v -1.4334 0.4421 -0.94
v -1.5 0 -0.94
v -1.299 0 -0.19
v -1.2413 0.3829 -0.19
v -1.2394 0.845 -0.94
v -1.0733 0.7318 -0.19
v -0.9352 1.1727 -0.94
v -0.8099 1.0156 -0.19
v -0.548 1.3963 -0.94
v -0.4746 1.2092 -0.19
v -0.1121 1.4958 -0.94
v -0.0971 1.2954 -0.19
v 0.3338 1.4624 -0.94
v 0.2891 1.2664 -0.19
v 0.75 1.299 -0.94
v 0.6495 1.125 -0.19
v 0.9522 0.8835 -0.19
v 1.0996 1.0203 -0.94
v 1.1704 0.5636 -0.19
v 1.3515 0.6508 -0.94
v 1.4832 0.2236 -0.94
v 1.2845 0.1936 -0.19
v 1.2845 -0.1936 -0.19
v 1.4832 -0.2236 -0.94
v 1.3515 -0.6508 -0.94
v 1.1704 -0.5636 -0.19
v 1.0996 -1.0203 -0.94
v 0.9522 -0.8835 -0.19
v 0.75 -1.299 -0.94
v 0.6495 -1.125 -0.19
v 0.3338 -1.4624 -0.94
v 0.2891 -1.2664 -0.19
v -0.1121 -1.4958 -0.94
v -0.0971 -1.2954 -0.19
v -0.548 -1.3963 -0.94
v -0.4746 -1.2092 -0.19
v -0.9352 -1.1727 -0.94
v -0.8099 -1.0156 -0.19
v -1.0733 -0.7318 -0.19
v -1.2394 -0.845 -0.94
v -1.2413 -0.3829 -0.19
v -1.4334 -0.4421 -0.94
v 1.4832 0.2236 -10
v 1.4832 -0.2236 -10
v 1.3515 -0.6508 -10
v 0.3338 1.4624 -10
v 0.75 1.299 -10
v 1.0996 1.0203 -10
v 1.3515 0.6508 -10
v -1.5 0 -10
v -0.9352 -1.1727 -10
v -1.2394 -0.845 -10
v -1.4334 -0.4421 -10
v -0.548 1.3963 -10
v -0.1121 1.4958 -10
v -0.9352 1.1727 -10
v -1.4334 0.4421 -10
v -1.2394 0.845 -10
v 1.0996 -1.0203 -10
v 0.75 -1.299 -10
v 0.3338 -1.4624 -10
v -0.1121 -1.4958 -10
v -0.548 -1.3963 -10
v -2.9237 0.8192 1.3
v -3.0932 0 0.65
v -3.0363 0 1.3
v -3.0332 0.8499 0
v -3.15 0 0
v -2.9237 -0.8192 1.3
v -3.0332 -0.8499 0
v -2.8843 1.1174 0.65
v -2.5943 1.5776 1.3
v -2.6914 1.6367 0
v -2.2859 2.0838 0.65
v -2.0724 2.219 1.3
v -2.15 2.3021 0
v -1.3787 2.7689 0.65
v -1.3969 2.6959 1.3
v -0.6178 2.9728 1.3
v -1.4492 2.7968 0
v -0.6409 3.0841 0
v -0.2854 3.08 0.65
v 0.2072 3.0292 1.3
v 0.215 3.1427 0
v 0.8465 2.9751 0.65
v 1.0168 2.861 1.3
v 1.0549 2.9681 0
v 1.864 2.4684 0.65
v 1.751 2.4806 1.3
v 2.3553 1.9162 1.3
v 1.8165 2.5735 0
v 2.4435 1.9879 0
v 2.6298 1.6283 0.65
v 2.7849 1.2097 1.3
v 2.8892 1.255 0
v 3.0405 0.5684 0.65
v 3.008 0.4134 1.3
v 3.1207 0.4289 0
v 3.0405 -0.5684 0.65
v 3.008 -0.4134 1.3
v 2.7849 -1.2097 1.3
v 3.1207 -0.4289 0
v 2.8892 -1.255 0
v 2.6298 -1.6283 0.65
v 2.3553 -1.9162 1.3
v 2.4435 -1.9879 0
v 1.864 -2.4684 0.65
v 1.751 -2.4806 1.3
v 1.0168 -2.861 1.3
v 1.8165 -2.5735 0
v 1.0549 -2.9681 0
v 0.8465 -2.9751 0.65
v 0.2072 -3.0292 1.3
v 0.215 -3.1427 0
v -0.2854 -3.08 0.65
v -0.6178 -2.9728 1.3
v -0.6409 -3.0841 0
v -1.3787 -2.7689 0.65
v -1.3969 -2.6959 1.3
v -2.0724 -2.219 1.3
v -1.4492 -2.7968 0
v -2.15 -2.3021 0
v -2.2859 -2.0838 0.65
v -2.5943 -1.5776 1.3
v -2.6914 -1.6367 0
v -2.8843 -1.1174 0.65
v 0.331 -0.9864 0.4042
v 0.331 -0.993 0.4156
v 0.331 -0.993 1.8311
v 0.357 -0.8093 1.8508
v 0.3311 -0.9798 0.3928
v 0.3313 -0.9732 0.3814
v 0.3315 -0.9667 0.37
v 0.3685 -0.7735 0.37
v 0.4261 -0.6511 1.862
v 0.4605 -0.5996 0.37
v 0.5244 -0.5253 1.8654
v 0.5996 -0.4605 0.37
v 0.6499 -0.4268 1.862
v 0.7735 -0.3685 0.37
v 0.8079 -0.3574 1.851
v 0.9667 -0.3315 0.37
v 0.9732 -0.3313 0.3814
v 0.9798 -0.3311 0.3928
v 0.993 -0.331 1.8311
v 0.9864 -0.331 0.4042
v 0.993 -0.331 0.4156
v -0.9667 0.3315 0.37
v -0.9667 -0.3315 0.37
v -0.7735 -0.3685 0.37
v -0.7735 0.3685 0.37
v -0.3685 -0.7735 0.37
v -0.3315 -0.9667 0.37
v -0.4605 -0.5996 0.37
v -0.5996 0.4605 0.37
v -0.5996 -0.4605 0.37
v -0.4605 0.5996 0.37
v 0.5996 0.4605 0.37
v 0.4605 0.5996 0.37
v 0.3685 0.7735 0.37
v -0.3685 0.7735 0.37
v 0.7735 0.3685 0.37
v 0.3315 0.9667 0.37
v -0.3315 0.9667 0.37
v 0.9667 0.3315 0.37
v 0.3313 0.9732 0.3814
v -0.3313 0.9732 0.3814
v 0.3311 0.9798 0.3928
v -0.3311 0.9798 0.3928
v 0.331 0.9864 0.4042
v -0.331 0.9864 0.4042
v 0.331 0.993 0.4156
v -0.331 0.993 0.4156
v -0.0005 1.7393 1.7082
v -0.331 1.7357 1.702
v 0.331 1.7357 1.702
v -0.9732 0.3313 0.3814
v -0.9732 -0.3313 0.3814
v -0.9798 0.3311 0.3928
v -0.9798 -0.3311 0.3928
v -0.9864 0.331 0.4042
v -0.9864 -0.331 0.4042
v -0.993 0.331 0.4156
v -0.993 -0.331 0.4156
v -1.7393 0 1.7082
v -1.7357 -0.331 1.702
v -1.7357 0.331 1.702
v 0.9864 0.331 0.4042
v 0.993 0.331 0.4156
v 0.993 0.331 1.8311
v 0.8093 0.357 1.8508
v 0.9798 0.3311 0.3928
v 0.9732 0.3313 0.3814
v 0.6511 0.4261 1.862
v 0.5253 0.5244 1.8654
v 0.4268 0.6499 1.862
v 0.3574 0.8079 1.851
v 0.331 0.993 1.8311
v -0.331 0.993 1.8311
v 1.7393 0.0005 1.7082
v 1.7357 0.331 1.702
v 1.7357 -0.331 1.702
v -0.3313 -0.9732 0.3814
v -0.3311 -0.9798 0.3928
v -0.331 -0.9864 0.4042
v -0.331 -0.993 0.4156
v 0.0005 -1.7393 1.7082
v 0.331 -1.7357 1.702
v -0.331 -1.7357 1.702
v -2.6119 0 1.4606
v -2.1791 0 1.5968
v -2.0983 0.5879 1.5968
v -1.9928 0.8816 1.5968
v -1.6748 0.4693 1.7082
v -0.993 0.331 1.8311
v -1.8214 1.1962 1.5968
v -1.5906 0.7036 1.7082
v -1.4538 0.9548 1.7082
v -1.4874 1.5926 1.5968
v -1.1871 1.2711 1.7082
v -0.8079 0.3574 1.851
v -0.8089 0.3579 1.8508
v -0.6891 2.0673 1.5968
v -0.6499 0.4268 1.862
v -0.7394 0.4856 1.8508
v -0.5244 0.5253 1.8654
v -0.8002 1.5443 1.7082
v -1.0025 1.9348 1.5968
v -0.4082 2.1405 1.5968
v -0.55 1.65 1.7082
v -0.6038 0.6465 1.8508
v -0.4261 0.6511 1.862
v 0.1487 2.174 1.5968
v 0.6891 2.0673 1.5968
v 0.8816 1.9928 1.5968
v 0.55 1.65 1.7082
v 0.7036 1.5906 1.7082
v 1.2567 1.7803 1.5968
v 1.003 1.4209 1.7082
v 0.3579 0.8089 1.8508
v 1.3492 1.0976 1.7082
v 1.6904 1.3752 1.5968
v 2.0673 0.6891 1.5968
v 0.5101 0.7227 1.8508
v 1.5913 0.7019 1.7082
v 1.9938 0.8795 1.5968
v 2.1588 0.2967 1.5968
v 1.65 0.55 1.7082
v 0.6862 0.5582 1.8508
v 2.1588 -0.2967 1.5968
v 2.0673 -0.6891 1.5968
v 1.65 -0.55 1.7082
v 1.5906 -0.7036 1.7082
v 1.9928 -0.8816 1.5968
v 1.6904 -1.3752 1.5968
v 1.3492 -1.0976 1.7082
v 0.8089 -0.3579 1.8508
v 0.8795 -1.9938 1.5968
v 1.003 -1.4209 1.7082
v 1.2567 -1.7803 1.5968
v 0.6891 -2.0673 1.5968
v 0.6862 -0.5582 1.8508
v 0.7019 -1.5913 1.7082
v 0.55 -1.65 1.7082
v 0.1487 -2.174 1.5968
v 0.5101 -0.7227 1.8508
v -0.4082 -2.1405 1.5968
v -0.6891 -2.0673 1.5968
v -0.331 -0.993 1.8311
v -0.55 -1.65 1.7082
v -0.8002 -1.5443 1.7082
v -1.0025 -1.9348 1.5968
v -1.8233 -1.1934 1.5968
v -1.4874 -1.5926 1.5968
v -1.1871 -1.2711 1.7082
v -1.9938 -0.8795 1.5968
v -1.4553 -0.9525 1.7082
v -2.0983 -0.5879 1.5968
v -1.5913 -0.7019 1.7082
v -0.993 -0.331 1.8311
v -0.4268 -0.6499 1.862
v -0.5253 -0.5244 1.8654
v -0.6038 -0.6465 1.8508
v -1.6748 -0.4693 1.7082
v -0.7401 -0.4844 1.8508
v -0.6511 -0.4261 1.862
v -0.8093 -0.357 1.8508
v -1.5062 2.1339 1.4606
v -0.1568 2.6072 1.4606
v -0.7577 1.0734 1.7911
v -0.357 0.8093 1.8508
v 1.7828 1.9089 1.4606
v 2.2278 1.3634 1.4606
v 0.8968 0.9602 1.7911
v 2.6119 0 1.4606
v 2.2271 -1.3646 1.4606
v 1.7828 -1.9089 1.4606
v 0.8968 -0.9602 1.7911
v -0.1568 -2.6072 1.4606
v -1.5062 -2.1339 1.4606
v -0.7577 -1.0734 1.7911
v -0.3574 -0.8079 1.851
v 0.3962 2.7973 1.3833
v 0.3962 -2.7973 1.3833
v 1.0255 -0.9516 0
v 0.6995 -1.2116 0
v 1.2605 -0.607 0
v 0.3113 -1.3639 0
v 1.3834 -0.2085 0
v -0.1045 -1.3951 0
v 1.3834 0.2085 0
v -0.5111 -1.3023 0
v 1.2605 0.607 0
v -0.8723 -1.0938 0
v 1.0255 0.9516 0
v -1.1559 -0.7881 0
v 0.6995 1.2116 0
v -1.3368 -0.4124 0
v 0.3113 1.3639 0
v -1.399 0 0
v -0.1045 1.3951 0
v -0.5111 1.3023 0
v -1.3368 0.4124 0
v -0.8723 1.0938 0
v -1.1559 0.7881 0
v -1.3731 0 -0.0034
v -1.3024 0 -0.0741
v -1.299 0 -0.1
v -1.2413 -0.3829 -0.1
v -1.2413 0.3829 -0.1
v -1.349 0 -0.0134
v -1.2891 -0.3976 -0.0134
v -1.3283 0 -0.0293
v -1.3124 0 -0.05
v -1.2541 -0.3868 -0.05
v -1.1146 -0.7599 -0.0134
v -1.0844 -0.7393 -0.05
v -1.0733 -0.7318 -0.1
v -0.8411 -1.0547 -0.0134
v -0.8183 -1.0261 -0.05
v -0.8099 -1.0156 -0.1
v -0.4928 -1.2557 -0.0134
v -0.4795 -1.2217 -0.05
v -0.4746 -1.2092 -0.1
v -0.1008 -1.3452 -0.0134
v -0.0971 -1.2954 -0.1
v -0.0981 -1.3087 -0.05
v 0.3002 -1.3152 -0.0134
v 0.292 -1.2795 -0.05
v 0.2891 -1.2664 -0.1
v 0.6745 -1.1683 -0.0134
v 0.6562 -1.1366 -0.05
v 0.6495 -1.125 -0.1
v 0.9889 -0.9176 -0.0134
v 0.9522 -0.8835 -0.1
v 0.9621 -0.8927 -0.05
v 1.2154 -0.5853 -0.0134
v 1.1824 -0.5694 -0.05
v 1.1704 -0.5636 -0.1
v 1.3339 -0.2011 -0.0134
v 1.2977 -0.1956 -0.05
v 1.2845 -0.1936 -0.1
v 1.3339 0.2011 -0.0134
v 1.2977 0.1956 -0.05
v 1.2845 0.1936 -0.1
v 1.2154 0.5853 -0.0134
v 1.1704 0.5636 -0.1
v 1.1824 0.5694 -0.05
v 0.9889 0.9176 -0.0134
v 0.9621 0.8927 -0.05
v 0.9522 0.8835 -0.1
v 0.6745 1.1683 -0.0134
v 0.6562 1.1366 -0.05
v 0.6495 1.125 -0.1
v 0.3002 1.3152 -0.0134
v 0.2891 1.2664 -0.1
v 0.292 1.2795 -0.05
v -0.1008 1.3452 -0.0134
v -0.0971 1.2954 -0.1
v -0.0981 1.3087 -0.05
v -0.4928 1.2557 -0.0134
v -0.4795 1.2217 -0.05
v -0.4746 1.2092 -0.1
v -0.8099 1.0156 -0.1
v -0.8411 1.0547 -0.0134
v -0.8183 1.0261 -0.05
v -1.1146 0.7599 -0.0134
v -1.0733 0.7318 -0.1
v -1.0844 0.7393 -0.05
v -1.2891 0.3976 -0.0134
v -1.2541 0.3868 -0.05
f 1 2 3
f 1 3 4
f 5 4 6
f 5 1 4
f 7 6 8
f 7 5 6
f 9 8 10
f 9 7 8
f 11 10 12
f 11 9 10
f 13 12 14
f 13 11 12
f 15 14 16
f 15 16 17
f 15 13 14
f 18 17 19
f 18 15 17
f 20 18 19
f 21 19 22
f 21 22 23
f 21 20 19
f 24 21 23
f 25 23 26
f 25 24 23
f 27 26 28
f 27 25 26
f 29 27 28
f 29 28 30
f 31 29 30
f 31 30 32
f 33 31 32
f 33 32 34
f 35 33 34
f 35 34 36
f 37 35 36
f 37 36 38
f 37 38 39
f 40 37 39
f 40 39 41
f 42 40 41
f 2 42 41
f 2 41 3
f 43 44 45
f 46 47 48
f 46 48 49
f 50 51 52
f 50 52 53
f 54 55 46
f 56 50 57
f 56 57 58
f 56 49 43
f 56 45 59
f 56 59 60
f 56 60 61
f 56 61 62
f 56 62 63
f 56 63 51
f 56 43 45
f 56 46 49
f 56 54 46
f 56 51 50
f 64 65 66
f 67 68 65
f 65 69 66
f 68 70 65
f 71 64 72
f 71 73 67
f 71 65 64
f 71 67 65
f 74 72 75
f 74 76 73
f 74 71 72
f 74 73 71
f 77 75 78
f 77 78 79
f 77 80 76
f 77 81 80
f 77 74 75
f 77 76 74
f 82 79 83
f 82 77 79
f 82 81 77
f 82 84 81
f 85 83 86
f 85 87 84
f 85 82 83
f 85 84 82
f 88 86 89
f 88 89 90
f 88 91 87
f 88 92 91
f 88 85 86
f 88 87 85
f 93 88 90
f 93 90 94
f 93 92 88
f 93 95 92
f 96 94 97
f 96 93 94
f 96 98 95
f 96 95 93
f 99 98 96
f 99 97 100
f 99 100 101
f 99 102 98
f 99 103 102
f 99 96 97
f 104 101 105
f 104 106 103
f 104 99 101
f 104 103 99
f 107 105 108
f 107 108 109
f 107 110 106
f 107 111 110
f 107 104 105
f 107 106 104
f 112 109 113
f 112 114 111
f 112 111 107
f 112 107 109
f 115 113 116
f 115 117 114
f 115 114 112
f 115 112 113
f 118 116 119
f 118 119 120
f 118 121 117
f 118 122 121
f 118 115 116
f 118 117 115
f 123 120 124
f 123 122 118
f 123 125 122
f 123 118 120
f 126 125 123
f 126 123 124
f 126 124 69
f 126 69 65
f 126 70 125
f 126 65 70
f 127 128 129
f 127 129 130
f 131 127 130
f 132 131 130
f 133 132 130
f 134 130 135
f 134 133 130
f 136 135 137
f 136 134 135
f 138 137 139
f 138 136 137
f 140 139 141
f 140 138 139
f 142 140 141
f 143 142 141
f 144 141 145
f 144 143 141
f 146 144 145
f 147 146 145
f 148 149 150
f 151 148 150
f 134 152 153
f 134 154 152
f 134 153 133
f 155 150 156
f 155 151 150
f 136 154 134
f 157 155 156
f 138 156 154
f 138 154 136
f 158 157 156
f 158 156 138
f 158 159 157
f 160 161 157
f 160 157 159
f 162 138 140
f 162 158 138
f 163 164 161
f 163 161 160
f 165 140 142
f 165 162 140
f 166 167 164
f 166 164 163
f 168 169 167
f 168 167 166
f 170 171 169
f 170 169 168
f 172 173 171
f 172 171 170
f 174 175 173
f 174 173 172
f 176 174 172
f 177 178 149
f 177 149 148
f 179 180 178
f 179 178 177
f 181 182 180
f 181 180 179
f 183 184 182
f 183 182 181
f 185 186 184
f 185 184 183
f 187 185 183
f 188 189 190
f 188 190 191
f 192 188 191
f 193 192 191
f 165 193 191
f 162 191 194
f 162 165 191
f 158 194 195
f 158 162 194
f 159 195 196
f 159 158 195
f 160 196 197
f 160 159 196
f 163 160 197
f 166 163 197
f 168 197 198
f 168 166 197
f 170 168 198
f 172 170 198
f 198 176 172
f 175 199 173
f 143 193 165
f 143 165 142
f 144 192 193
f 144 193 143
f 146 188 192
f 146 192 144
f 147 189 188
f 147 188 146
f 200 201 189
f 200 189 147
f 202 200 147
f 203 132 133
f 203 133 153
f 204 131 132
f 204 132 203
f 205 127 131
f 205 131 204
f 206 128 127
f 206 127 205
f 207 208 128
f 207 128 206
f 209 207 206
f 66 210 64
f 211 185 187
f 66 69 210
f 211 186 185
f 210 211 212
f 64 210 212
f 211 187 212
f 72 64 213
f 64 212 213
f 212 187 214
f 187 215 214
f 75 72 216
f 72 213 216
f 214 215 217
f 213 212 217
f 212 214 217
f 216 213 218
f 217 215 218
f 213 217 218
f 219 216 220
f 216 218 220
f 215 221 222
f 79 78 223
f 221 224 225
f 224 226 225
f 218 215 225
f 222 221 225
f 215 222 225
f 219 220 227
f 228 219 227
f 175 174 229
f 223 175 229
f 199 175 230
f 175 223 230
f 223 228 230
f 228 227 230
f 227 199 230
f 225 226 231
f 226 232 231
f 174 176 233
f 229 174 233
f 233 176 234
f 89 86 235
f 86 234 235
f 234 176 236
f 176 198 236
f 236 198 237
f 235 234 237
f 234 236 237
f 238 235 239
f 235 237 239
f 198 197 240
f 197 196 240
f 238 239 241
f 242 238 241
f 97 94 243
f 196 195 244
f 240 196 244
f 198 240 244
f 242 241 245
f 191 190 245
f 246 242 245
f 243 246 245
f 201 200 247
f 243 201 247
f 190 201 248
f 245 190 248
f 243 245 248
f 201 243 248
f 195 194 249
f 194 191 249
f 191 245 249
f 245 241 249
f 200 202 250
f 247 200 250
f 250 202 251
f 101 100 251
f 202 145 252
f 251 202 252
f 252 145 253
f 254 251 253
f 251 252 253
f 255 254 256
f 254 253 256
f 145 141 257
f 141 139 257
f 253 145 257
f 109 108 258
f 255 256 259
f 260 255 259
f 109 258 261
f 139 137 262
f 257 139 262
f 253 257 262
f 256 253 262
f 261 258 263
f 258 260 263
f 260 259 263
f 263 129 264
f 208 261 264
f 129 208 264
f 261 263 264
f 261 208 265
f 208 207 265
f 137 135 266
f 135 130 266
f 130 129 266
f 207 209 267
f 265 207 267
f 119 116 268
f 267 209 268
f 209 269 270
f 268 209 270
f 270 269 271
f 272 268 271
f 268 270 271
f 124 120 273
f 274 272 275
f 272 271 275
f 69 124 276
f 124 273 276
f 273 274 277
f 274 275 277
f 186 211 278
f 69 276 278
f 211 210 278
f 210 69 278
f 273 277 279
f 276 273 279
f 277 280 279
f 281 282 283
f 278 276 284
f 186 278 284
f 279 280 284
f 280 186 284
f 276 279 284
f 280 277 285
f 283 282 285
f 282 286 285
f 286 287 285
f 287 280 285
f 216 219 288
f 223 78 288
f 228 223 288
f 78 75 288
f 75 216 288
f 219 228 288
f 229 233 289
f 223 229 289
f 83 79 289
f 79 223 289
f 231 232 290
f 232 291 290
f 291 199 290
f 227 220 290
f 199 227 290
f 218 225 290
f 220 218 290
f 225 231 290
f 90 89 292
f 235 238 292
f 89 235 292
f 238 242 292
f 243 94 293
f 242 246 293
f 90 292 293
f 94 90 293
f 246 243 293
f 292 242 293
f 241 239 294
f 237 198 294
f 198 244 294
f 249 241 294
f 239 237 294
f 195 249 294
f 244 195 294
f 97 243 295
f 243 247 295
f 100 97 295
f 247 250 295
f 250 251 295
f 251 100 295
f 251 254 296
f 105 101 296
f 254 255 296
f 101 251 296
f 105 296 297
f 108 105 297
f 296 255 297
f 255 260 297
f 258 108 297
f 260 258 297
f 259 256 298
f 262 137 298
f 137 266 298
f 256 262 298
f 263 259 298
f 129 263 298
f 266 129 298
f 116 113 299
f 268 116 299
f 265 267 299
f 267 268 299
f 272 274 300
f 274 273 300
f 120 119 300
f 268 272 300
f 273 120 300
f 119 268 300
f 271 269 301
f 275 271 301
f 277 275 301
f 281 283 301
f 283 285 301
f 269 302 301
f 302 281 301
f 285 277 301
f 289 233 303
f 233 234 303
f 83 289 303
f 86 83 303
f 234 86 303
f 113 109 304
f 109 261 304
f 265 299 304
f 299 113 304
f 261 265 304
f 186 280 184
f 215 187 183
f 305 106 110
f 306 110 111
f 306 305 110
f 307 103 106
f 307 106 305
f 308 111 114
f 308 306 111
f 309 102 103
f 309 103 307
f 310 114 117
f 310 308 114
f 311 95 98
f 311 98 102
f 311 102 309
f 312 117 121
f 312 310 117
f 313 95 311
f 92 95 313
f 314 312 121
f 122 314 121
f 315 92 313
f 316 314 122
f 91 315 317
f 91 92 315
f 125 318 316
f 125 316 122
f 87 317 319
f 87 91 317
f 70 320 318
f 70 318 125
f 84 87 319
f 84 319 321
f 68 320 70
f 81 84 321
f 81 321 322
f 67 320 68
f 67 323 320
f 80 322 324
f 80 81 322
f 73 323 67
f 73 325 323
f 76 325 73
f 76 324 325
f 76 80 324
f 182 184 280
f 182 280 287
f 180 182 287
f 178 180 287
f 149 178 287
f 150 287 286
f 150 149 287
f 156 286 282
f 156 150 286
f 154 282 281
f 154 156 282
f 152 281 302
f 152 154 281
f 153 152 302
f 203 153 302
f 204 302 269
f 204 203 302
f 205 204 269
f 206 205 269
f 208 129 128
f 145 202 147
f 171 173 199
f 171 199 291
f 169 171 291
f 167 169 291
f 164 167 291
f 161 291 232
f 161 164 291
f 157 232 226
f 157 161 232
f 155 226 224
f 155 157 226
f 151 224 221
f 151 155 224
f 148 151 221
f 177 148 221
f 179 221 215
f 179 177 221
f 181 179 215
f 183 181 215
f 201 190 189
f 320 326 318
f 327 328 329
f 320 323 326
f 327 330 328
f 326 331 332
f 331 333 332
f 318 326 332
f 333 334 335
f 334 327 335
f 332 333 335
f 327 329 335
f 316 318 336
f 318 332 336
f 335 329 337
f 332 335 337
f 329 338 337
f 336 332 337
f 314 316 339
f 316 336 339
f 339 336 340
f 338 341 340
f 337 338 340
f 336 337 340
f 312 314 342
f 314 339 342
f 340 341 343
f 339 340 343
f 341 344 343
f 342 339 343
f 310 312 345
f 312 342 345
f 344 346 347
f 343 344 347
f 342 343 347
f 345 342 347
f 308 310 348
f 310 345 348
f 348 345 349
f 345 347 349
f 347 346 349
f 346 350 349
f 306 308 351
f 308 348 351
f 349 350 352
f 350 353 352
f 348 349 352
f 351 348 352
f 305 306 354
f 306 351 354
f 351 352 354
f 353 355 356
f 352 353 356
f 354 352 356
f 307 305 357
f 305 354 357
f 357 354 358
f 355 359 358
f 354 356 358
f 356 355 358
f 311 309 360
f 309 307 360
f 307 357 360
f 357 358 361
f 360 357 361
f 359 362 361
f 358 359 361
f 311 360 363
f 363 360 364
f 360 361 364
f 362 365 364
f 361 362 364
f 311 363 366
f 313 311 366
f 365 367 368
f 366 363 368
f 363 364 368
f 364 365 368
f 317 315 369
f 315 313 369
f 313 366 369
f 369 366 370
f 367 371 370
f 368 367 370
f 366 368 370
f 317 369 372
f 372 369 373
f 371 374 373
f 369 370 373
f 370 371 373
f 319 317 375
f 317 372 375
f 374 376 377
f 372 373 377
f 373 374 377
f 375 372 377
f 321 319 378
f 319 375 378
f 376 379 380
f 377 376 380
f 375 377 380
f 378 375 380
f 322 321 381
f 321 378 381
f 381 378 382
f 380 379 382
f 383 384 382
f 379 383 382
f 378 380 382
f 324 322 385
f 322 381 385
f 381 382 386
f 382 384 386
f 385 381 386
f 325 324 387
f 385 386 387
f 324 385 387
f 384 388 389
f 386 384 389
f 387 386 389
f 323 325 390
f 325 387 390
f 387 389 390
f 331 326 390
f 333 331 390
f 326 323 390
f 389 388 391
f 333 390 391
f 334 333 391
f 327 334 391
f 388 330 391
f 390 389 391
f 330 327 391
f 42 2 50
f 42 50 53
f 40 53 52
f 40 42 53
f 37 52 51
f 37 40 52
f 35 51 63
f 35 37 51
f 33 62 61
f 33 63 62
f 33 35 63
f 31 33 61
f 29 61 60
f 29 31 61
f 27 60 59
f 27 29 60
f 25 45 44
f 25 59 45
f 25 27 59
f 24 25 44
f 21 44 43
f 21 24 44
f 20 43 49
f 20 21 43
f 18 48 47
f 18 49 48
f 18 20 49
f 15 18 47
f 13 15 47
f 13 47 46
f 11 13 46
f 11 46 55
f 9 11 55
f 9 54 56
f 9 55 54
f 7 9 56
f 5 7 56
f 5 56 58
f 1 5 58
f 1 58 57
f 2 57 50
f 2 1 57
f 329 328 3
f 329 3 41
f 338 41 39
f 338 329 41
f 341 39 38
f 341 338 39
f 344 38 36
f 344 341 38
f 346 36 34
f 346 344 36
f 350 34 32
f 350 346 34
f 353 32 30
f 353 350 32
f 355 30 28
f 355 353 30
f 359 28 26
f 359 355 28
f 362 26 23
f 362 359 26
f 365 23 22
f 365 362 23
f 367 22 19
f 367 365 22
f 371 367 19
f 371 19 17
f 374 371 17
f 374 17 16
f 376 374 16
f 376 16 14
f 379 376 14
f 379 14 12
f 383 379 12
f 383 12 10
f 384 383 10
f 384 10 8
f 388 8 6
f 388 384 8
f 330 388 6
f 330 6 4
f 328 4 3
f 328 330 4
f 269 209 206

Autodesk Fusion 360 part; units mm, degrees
sketch "Sketch1" plane through (0, 0, 0) normal (0, 1, 0) x (1, 0, 0)
  line L0 (0, -1.9) -> (0, 10)
  line L1 (-3.15, 0) -> (-3.0363, -1.3)
  line L2 (-3.15, 0) -> (-1.399, 0)
  arc A0 (-3.0363, -1.3) -> (0, -1.9) centre (0, 6.0824) ccw
  line L3 (0, 10) -> (-1.5, 10)
  line L4 (-1.5, 10) -> (-1.5, 0.94)
  line L5 (-1.5, 0.94) -> (-1.299, 0.19)
  line L6 (-1.299, 0.19) -> (-1.299, 0.1)
  line L7 (-1.299, 0.1) -> (-1.399, 0.1) construction
  line L8 (-1.399, 0.1) -> (-1.399, 0) construction
  circle A1 centre (-1.399, 0.1) radius 0.1
  dimension "d13" = 5
  dimension "d14" = 6.3
  dimension "d15" = 0.6
  dimension "d17" = 1.3
  dimension "d18" = 3
  dimension "d19" = 10
  dimension "d20" = 9.06
  dimension "d22" = 0.75
  dimension "d23" = 15
  dimension "d24" = 0.1
  dimension "d25" = 0.1
  dimension "d26" = 0.2
revolve "Revolve1" add sketch "Sketch1" angle 360 about axis through (0, 0, 1.9) along (0, 0, -1) contours L0 L1 L2 A0 L3 L4 L5 L6 A1 makes body 1
ref_plane "WorkPlane1" through (0, 0, 1.9) normal (0, 0, 1) x (1, 0, 0)
sketch "Sketch2" plane through (0, 0, 1.9) normal (0, 0, 1) x (1, 0, 0)
  line L0 (-1.85, 0) -> (1.85, 0) construction
  line L1 (0, -1.85) -> (0, 1.85) construction
  line L2 (-0.331, 1.85) -> (0.331, 1.85)
  line L3 (0.331, 1.85) -> (0.331, 0.331)
  line L4 (0.331, 0.331) -> (1.85, 0.331)
  line L5 (1.85, 0.331) -> (1.85, -0.331)
  line L6 (1.85, -0.331) -> (0.331, -0.331)
  line L7 (0.331, -0.331) -> (0.331, -1.85)
  line L8 (0.331, -1.85) -> (-0.331, -1.85)
  line L9 (-0.331, -1.85) -> (-0.331, -0.331)
  line L10 (-0.331, -0.331) -> (-1.85, -0.331)
  line L11 (-1.85, -0.331) -> (-1.85, 0.331)
  line L12 (-1.85, 0.331) -> (-0.331, 0.331)
  line L13 (-0.331, 0.331) -> (-0.331, 1.85)
  dimension "d39" = 3.7
  dimension "d40" = 3.7
  dimension "d41" = 0.662
  dimension "d42" = 0.662
extrude "Extrude1" add sketch "Sketch2" against normal blind 1.53 separate body makes body 2
draft "Draft1" angle -30 neutral plane through (0, 0, 1.9) pull (0, 0, 1) 4 faces at (0.1103, -1.85, 1.39) (-0.1103, 1.85, 1.39) (-1.85, -0.1103, 1.39) (1.85, 0.1103, 1.39) on bodies 2
fillet "Fillet1" radius 0.662 4 edges at (0.331, -0.331, 1.135) (-0.331, -0.331, 1.135) (-0.331, 0.331, 1.135) (0.331, 0.331, 1.135) on bodies 2
combine "Combine1" operation cut target body 1 tool bodies 2
thread "Thread1"
equation "adsk_nomdia = 3.00 mm"
equation "adsk_nomlen = 10.00 mm"
equation "adsk_headdia = 6.30 mm"
equation "adsk_bheig = 1.30 mm"
equation "adsk_phildia = 3.70 mm"
equation "adsk_r = 0.10 mm"
equation "adsk_thrlen = 9.06 mm"
equation "adsk_phildepth = 1.53 mm"
equation "adsk_grplen = 0.94 mm"
equation "adsk_runout = 0.75 mm"
equation "adsk_runang = 15.00 deg"
equation "adsk_headang = 5.00 deg"
equation "d13 = adsk_headang"
equation "d14 = adsk_headdia"
equation "d15 = adsk_ovalh"
equation "adsk_ovalh = 0.60 mm"
equation "d17 = adsk_bheig"
equation "d18 = adsk_nomdia"
equation "d19 = adsk_nomlen"
equation "d20 = adsk_thrlen"
equation "d22 = adsk_runout"
equation "d24 = adsk_r"
equation "d25 = adsk_r"
equation "d26 = adsk_r * 2"
equation "d32 = adsk_bheig + adsk_ovalh"
equation "adsk_philwidth = 0.662 mm"
equation "d39 = adsk_phildia"
equation "d40 = adsk_phildia"
equation "d41 = adsk_philwidth"
equation "d42 = adsk_philwidth"
equation "d48 = adsk_philwidth"
properties part number "arrangementsContainer"
